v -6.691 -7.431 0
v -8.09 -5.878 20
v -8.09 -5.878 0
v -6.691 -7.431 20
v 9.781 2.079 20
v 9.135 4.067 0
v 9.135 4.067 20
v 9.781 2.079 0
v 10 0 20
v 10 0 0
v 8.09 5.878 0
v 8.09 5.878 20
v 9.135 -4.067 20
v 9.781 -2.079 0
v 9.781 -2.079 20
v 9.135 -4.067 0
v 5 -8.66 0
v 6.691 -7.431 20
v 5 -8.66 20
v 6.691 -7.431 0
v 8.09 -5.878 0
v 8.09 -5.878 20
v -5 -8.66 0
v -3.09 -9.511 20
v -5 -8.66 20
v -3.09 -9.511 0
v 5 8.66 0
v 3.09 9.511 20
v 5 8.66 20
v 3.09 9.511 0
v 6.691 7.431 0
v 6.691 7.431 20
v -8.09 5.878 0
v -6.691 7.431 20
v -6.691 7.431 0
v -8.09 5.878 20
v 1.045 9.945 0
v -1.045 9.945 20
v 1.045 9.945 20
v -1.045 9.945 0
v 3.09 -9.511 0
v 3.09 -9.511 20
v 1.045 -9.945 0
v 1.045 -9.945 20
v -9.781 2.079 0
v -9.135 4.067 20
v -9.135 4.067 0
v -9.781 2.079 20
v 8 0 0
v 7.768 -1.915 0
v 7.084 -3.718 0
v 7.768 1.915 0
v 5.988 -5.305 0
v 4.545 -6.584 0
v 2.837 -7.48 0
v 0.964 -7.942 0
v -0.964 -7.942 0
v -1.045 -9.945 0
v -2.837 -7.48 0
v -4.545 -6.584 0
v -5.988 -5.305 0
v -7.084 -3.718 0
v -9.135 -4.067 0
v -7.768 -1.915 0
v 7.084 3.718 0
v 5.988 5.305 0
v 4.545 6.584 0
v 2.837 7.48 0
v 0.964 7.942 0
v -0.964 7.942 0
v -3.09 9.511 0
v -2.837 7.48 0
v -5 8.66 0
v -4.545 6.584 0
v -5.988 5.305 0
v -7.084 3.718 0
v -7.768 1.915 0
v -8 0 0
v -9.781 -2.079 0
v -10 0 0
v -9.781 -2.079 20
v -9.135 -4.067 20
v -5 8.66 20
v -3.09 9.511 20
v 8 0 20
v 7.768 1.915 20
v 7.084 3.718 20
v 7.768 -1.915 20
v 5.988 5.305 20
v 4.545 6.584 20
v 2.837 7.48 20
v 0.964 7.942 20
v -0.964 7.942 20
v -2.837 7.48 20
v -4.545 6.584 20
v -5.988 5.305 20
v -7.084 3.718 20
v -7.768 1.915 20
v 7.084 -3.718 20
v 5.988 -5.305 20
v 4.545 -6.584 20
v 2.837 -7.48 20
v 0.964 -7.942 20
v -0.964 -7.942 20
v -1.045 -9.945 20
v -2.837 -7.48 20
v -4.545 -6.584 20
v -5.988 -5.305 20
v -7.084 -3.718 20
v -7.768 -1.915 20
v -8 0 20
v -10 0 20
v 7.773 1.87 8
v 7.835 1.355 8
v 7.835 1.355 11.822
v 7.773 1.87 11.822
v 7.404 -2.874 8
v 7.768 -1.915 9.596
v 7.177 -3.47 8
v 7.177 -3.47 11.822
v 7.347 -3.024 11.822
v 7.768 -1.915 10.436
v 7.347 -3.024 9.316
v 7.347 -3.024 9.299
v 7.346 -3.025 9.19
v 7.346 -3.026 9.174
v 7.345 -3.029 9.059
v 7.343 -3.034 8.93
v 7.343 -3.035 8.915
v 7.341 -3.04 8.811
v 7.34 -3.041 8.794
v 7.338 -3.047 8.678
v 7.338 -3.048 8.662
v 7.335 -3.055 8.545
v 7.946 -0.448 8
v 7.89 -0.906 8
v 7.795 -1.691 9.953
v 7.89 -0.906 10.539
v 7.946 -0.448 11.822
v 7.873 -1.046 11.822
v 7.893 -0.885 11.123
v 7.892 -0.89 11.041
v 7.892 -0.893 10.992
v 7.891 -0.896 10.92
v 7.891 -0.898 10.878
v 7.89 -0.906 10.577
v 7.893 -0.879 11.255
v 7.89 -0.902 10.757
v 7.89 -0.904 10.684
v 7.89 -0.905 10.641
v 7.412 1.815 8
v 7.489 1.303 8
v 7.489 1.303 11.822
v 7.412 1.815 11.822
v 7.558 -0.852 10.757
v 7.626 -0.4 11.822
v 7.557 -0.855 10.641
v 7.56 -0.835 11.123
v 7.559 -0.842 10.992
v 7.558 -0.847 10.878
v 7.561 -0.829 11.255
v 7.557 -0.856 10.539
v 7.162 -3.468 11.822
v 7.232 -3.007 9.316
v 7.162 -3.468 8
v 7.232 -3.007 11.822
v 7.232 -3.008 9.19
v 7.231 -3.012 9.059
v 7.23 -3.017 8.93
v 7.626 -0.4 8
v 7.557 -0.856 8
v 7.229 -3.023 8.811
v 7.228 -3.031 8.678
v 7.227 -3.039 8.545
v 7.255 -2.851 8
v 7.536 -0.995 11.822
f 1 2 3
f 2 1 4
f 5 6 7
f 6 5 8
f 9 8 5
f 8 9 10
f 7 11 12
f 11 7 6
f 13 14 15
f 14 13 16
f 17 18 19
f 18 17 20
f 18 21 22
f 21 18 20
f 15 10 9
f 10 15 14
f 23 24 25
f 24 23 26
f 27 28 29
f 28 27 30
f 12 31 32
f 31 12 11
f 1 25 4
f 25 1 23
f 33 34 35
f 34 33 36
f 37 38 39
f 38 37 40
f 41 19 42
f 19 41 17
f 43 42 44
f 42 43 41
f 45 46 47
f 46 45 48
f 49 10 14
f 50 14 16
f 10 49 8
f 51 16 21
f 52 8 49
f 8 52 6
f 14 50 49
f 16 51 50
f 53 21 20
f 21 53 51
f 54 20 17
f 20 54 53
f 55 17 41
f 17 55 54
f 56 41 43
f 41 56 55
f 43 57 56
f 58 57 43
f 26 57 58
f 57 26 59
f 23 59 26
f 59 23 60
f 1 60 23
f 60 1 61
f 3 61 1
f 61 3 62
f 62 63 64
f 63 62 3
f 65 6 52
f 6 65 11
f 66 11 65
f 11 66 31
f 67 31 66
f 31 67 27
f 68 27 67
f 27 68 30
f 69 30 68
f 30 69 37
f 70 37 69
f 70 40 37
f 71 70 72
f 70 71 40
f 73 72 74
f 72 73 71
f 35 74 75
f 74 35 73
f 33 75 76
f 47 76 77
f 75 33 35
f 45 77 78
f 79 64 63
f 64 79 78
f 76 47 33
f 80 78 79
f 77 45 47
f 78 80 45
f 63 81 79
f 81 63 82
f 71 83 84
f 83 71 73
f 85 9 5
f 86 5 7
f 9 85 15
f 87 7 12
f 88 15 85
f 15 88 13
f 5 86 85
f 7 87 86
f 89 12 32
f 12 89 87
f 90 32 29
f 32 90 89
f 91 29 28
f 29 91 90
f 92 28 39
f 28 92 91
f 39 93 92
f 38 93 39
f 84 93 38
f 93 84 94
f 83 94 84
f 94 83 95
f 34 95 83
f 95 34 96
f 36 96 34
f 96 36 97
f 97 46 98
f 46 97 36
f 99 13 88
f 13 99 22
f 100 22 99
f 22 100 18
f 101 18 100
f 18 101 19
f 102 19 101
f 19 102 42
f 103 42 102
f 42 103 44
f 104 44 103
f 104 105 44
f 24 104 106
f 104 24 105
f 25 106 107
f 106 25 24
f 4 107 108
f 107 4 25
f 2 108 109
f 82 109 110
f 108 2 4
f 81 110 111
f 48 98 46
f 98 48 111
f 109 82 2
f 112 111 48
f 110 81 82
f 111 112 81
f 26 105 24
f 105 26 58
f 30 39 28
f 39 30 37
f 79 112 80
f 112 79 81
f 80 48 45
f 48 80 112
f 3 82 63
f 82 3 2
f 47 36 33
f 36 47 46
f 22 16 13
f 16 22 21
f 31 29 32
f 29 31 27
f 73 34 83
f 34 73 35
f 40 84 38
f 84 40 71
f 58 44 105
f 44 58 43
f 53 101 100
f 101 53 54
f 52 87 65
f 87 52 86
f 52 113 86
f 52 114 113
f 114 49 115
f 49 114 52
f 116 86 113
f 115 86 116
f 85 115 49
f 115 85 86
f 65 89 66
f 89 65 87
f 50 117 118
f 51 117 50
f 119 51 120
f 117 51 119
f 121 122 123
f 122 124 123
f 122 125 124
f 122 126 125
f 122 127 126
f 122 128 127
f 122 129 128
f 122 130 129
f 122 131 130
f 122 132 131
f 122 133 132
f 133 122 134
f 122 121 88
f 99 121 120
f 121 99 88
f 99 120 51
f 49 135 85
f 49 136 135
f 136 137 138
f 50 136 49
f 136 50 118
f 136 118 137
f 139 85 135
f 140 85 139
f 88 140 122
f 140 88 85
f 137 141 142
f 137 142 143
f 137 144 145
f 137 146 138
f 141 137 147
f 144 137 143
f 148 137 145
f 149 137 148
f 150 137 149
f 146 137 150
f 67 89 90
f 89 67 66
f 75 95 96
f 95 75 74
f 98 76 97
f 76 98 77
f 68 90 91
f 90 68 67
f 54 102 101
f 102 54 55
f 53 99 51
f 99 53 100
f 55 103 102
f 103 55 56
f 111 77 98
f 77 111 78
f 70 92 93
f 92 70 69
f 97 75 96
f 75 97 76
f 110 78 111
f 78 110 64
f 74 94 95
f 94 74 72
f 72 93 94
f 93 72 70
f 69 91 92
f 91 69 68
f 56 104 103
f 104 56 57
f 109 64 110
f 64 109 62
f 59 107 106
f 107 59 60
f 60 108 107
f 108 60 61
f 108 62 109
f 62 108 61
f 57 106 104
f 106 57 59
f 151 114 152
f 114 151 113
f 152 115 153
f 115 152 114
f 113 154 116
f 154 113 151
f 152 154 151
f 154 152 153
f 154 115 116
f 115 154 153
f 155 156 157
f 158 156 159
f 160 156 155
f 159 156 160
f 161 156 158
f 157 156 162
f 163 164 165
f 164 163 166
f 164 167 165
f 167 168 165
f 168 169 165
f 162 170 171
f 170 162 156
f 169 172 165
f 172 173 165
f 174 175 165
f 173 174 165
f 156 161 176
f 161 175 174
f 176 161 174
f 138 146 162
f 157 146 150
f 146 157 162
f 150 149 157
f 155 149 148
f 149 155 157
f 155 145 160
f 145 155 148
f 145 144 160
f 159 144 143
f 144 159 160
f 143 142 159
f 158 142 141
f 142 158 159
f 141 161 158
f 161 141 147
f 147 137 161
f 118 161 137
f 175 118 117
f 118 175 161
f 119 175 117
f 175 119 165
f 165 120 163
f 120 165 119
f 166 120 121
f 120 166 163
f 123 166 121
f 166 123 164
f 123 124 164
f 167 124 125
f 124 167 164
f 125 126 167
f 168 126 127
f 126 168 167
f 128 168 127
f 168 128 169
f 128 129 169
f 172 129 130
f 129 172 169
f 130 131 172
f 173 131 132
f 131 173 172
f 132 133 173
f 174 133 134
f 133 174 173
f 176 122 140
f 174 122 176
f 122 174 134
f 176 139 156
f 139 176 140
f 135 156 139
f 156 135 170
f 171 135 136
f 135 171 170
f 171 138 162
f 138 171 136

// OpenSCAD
// Generated by scadwright. Do not hand-edit —
// edit the Python source and regenerate.

union() {
    // Tube
    //  h   = 20  (input)
    //  od  = 20  (input)
    //  thk = 2  (input)
    difference() {
        cylinder(h=20, r=10, center=false);
        translate([0, 0, -0.01]) {
            scale([1, 1, 1.001]) {
                cylinder(h=20, r=8, center=false);
            }
        }
    }

    translate([8.40455, 1.27022, 10]) {
        multmatrix([[0.149438, 0, -0.988771, 0], [-0.988771, 0, -0.149438, 0], [0, 1, 0, 0], [0, 0, 0, 1]]) {
            linear_extrude(height=0.9, center=false) {
                translate([-1.2, -2, 0]) {
                    text("I", size=4);
                }
            }
        }
    }

    translate([8.40455, -1.27022, 10]) {
        multmatrix([[-0.149438, 0, -0.988771, 0], [-0.988771, 0, 0.149438, 0], [0, 1, 0, 0], [0, 0, 0, 1]]) {
            linear_extrude(height=0.9, center=false) {
                translate([-1.2, -2, 0]) {
                    text("N", size=4);
                }
            }
        }
    }
}
